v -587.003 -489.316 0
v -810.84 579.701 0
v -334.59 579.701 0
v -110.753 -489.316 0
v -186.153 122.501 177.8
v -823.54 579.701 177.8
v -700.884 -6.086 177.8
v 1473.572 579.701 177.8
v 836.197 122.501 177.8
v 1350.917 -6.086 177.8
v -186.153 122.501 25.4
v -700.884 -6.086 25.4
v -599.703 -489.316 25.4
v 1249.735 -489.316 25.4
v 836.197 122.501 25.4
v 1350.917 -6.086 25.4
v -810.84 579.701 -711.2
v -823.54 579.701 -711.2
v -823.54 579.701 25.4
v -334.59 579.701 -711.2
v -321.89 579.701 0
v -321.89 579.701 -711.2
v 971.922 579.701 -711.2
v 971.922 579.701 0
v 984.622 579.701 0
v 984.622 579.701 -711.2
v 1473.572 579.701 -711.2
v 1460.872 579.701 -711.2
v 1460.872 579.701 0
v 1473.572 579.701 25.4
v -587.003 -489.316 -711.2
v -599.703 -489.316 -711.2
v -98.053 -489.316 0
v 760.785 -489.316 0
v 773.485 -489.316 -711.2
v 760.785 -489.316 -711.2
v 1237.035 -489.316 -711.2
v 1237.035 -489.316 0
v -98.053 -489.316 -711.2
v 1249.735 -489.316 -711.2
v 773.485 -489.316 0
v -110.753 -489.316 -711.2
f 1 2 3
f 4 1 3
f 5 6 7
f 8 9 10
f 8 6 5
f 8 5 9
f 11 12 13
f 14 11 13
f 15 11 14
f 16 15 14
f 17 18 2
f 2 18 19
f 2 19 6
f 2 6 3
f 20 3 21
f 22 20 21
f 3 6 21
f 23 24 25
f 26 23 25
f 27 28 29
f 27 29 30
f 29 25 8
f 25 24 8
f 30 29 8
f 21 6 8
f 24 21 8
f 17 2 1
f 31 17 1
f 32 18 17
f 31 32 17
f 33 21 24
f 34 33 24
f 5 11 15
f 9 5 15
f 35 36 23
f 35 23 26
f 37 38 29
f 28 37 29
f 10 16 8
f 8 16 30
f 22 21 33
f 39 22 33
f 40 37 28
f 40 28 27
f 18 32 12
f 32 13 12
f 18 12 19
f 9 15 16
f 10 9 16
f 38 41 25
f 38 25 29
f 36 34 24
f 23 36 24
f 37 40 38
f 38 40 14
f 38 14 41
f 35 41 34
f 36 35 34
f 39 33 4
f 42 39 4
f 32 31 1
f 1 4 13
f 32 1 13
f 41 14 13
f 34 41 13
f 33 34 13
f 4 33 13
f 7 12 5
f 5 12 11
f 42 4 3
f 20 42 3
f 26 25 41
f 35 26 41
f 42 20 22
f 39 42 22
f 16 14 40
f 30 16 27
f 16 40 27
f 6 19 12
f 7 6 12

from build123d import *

# Parameters (mm, degrees)
F1_DEPTH = 25.4
F3_DEPTH = 152.4
F5_DEPTH = 711.2


with BuildPart() as f1:
    # F0 (on Top) → F1 (new body)
    with BuildSketch(Plane.XY):
        Polygon((-823.540136, 579.701138), (-599.702636, -489.315987), (1249.734864, -489.315987), (1473.572364, 579.701138), align=None)
    extrude(amount=F1_DEPTH)

    # F2 (on face) → F3 (join)
    with BuildSketch(Plane.XY.offset(25.4)):
        Polygon((1473.572364, 579.701138), (-823.540136, 579.701138), (-700.884281, -6.086362), (-186.153281, 122.501138), (836.196719, 122.501138), (1350.916509, -6.086362), align=None)
    extrude(amount=F3_DEPTH)

    # F4 (on face) → F5 (join)
    with BuildSketch(Plane(origin=(0, 0, 0), x_dir=(1, 0, 0), z_dir=(0, 0, -1))):
        Polygon((-810.840136, -579.701138), (-587.002636, 489.315987), (-599.702636, 489.315987), (-823.540136, -579.701138), align=None)
        Polygon((-321.890136, -579.701138), (-98.052636, 489.315987), (-110.752636, 489.315987), (-334.590136, -579.701138), align=None)
        Polygon((984.622364, -579.701138), (773.484864, 489.315987), (760.784864, 489.315987), (971.922364, -579.701138), align=None)
        Polygon((1473.572364, -579.701138), (1249.734864, 489.315987), (1237.034864, 489.315987), (1460.872364, -579.701138), align=None)
    extrude(amount=F5_DEPTH)


solid = f1.part
